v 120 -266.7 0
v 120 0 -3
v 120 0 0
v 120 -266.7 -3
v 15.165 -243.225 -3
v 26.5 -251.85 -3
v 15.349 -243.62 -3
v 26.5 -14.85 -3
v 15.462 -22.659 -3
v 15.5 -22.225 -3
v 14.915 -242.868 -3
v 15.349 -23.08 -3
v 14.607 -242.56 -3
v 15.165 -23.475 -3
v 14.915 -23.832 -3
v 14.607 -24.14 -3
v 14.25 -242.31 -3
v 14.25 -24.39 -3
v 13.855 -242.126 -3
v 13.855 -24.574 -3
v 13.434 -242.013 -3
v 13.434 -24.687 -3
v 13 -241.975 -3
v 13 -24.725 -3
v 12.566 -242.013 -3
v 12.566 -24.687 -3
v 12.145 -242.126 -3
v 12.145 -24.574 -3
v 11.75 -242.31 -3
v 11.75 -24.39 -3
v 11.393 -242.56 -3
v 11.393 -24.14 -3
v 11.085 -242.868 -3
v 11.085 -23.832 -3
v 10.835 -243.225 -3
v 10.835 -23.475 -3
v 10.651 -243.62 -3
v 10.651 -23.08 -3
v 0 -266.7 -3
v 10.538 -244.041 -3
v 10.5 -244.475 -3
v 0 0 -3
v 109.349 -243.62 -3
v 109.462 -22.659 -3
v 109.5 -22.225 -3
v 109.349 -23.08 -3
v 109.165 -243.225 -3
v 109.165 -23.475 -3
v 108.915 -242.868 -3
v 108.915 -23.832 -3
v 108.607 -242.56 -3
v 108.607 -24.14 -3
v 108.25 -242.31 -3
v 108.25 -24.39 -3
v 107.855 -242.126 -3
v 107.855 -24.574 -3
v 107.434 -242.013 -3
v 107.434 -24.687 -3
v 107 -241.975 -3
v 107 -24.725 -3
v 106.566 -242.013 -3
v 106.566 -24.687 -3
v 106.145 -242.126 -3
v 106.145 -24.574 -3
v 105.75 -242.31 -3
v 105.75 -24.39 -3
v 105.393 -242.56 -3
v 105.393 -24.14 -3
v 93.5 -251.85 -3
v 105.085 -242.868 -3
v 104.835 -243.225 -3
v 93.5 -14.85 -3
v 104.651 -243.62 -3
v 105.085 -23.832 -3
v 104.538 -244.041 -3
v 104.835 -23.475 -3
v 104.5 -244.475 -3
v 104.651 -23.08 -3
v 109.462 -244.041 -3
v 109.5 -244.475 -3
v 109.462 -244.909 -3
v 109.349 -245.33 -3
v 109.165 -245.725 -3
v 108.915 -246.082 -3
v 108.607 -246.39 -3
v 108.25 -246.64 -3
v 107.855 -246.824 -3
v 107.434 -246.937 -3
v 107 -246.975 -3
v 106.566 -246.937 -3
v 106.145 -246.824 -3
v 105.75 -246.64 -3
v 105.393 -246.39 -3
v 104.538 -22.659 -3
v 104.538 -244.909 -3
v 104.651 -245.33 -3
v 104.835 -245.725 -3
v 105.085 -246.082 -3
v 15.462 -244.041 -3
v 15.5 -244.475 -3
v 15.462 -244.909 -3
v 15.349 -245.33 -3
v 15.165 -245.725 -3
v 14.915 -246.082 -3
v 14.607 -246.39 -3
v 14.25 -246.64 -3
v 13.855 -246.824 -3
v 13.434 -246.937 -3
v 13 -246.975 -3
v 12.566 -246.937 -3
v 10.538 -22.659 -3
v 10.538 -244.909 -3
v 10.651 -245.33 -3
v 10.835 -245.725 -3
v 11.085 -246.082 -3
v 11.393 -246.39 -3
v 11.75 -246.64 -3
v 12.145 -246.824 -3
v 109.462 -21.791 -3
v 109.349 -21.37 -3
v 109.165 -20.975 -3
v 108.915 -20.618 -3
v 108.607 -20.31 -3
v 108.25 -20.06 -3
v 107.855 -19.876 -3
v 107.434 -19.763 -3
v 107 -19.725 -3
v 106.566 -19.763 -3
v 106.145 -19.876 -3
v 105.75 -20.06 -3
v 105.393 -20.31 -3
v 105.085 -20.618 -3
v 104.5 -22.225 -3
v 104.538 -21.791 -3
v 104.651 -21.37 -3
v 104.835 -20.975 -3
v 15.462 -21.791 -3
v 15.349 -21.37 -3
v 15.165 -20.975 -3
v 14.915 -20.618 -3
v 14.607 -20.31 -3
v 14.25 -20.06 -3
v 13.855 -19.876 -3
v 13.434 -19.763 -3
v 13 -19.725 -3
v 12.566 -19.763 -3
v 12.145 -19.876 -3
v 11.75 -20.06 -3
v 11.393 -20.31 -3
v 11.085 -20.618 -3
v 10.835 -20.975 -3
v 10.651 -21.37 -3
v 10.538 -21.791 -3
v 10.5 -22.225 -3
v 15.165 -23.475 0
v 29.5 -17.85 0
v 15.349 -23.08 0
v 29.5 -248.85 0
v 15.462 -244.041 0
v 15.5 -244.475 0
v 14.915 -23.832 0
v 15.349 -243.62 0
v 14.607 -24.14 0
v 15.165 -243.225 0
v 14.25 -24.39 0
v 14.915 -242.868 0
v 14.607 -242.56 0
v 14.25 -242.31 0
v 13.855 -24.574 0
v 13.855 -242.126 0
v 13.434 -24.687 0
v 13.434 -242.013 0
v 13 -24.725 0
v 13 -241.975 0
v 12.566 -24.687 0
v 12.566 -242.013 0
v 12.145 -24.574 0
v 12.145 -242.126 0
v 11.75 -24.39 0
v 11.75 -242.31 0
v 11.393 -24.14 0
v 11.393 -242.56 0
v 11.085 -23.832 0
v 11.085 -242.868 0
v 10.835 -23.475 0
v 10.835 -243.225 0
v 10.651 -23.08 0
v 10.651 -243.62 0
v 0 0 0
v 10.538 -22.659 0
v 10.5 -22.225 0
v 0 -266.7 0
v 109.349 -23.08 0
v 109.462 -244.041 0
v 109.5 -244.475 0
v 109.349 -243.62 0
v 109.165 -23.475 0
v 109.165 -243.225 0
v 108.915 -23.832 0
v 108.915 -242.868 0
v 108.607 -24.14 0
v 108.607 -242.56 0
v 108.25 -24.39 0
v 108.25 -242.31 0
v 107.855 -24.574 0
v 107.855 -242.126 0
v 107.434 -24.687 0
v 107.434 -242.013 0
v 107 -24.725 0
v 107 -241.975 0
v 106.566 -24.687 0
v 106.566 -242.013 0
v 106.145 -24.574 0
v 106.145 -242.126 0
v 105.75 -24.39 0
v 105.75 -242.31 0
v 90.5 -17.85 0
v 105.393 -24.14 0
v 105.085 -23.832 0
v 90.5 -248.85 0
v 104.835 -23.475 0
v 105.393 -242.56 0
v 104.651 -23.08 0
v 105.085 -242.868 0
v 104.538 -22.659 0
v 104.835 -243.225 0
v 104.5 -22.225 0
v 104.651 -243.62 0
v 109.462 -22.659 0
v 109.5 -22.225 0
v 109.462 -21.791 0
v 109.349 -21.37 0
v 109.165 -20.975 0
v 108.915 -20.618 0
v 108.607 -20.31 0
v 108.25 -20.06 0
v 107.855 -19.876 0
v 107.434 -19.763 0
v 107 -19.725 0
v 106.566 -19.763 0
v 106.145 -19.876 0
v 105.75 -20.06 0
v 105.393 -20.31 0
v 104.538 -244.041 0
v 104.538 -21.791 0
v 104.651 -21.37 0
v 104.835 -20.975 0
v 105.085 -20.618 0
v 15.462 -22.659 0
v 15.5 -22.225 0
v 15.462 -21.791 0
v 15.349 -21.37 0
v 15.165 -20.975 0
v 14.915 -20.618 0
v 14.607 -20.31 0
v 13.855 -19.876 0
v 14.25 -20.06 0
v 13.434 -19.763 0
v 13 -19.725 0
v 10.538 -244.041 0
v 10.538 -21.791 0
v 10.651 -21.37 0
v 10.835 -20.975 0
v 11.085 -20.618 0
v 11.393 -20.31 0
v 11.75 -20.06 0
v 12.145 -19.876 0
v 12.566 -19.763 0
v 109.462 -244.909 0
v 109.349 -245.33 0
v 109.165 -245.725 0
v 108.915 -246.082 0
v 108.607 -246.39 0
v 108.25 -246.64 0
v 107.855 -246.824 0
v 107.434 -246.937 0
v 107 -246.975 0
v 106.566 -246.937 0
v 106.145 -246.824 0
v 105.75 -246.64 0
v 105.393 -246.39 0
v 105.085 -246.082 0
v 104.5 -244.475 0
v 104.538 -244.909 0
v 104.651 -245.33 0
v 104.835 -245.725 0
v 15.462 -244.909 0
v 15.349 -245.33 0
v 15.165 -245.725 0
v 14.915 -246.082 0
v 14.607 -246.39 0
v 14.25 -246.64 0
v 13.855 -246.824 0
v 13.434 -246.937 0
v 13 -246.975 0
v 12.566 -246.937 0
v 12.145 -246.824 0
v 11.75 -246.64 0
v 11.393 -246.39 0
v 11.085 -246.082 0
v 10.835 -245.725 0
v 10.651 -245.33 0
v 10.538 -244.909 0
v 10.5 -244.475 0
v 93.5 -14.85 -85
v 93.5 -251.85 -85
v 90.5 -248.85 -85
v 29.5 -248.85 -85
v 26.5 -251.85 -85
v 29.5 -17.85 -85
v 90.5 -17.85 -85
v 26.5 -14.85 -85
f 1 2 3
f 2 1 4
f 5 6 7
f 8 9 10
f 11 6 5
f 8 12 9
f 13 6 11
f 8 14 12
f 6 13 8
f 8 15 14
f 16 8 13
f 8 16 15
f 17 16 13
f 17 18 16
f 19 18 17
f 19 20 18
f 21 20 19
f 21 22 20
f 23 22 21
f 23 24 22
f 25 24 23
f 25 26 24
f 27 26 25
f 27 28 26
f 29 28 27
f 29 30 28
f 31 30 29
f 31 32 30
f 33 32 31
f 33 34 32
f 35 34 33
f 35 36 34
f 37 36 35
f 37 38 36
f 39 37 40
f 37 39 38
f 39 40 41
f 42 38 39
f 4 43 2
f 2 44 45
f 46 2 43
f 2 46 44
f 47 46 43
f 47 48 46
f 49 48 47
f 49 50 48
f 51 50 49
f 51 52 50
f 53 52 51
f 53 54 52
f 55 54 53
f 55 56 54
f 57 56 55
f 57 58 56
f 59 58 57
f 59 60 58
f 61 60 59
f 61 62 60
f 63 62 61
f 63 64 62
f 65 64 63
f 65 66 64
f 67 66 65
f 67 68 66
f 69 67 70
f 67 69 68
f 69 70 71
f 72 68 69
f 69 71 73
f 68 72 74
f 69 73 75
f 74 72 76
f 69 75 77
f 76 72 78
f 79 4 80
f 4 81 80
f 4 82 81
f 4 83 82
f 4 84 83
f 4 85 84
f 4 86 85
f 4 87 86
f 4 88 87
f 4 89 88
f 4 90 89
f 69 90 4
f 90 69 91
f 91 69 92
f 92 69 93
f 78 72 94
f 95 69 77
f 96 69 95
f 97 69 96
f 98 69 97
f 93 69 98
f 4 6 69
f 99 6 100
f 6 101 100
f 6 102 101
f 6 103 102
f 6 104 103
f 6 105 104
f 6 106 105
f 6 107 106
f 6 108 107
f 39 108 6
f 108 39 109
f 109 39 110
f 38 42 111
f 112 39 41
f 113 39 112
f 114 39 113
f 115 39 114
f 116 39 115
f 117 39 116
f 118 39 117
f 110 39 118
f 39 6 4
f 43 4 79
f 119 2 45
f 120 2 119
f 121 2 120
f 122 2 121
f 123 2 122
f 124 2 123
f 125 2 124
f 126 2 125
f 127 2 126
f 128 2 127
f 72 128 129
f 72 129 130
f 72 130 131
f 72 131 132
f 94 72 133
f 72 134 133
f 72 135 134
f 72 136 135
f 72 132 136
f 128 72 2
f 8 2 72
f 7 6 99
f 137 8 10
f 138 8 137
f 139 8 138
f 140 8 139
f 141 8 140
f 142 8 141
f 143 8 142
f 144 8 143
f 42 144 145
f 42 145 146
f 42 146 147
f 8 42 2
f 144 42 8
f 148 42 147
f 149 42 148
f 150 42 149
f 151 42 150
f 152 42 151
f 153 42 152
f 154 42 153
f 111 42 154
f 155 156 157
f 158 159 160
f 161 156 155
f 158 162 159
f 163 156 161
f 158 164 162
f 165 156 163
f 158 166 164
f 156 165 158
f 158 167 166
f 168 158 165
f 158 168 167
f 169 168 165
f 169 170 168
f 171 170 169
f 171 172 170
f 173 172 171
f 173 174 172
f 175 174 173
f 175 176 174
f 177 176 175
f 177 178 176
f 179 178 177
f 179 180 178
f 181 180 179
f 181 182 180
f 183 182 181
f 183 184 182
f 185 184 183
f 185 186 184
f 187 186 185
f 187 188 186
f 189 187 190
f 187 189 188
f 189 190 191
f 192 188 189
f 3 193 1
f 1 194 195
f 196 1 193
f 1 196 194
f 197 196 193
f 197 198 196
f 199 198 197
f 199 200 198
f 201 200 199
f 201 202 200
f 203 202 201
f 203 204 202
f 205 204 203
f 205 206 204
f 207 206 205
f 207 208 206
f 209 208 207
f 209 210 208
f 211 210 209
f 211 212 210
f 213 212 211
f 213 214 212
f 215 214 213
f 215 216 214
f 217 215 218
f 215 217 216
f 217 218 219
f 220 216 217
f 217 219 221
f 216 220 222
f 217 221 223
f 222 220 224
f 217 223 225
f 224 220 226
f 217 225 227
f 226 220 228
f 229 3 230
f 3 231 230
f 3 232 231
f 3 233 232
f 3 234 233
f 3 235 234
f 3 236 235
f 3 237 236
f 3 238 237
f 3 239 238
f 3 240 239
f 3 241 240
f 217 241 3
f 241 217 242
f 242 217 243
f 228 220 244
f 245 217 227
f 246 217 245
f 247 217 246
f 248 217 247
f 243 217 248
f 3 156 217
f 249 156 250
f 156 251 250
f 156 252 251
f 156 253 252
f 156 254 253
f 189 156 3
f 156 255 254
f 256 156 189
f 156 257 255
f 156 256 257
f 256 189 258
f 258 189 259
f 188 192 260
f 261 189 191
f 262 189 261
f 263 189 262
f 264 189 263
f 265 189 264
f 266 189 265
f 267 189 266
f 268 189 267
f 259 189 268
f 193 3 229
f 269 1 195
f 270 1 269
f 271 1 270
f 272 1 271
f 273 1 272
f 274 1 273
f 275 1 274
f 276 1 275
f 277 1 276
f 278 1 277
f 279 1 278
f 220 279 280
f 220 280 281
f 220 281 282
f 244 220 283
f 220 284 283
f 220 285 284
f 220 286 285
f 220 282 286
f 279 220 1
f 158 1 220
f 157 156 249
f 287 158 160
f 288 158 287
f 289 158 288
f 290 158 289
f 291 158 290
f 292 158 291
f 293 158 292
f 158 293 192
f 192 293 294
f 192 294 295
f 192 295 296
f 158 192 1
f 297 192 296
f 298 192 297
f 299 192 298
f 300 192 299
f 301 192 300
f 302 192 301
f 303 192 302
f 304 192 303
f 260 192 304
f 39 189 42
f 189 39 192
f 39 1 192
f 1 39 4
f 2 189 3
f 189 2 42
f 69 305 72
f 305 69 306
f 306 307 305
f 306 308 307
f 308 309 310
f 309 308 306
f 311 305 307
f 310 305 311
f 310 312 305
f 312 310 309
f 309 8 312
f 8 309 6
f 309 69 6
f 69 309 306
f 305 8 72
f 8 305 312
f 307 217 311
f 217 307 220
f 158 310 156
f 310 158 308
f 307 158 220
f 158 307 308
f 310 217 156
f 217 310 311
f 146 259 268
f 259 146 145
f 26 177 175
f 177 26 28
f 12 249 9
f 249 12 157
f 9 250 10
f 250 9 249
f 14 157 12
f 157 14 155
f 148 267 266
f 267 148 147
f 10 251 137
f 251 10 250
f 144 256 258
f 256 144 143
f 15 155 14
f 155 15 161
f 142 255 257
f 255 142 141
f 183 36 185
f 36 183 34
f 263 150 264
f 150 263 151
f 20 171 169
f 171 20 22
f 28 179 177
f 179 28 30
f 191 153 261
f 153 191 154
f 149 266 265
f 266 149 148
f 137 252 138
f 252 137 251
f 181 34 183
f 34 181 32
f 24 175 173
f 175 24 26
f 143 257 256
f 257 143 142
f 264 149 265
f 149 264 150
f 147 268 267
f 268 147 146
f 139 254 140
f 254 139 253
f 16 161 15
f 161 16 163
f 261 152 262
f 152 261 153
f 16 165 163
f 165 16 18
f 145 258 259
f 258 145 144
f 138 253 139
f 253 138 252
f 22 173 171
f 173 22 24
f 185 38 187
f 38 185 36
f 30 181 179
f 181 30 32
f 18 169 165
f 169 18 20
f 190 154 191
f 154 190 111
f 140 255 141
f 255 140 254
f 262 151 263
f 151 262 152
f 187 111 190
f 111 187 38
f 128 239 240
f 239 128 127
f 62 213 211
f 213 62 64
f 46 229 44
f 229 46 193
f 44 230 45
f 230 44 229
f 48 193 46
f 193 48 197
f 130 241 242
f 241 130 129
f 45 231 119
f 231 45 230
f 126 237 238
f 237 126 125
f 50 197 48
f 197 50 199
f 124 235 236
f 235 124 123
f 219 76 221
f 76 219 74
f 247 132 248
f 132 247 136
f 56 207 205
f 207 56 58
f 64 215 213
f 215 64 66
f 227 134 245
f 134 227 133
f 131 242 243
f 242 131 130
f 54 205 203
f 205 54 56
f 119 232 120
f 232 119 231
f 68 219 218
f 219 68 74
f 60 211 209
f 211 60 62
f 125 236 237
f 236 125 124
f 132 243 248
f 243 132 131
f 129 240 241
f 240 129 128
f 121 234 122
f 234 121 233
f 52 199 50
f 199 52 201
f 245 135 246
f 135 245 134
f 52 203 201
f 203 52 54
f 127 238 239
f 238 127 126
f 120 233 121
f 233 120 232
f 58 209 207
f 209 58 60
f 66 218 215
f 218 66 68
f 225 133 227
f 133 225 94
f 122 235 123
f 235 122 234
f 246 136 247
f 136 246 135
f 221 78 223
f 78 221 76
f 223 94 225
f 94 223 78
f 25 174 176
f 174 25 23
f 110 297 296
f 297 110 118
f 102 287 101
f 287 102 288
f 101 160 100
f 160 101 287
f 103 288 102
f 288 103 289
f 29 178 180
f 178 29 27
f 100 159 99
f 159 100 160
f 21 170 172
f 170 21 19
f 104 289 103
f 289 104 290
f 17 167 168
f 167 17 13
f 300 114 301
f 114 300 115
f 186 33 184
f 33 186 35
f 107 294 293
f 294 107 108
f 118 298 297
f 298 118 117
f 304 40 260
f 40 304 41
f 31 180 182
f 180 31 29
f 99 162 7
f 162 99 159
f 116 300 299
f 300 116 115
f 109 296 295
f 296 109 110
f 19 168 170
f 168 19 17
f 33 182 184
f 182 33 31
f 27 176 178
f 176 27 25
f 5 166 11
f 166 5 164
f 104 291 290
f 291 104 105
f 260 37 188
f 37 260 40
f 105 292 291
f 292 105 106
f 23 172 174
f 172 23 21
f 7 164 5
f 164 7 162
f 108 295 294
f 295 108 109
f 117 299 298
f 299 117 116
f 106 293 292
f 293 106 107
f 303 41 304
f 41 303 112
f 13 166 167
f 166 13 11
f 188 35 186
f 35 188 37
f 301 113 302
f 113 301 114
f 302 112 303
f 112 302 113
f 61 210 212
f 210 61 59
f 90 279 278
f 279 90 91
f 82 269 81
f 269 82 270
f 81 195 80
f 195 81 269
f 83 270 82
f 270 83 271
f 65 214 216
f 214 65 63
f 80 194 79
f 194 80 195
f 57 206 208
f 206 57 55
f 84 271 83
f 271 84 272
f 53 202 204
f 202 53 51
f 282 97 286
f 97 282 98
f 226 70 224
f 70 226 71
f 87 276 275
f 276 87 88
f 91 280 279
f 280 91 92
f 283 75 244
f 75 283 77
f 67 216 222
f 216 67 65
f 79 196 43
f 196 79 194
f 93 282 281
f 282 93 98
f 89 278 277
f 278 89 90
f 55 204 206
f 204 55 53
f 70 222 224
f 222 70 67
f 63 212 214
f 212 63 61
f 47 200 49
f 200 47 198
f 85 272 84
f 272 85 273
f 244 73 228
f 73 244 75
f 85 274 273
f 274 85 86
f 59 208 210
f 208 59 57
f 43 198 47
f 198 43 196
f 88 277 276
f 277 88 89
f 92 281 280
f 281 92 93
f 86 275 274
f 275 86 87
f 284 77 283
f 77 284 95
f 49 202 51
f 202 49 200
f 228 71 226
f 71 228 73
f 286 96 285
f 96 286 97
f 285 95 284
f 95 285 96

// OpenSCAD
// file: dotSCAD-2.1/src/rounded_square.scad
module rounded_square(size,radius) {
    hull() {
        translate([radius, radius])
            circle(radius);
        translate([size.x - radius, radius])
            circle(radius);
        translate([radius, size.y - radius])
            circle(radius);
        translate([size.x - radius, size.y - radius])
            circle(radius);
    }
}
// main file
include <dotSCAD-2.1/src/rounded_square.scad>;

// Rack for FIOS router/wifi

module rack(){
one_u=44.45;

rack_width=120;
rack_height=6*one_u;

walls_thickness=3;

//(158 × 101 × 25 mm)
device_width=60+1; //?
device_height=230+1; //?
device_depth=120; //? this is only used to make a hole

support_depth=85;

offset=0; // shift device on the plate a bit

difference(){
difference(){

difference(){
union(){
//faceplate
cube([rack_width,rack_height,walls_thickness]);
    
//device support    
translate([(rack_width-device_width)/2-walls_thickness+offset,rack_height/2-(device_height/2+walls_thickness),0]) 
    cube([device_width+2*walls_thickness,device_height+2*walls_thickness,support_depth]);
}

// device number
//translate([30,37.5,-2]) 
//mirror([0,1,0])
//linear_extrude(height = 10)
//   resize([16,20]) 
//   import (file = "/Users/dkachaev/Dropbox/raspberrypi_logo.dxf", scale=0.1);
}

//device face/hole
//translate([(rack_width-device_width)/2+offset,device_height/2,-2]) 
translate([(rack_width-device_width)/2+offset,rack_height/2-(device_height/2),-2]) 
    cube([device_width,device_height,device_depth]);
}


$fn=36;

//holes (2 holes, hole 2 only in 1U)
union(){
translate([13,one_u/2,-1]) cylinder(10,2.5,2.5);

translate([rack_width-13,one_u/2,-1]) cylinder(10,2.5,2.5);

translate([13,one_u/2+5*one_u,-1]) cylinder(10,2.5,2.5);

translate([rack_width-13,one_u/2+5*one_u,-1]) cylinder(10,2.5,2.5);

}


}
}

rotate([180,0,0]) rack();
